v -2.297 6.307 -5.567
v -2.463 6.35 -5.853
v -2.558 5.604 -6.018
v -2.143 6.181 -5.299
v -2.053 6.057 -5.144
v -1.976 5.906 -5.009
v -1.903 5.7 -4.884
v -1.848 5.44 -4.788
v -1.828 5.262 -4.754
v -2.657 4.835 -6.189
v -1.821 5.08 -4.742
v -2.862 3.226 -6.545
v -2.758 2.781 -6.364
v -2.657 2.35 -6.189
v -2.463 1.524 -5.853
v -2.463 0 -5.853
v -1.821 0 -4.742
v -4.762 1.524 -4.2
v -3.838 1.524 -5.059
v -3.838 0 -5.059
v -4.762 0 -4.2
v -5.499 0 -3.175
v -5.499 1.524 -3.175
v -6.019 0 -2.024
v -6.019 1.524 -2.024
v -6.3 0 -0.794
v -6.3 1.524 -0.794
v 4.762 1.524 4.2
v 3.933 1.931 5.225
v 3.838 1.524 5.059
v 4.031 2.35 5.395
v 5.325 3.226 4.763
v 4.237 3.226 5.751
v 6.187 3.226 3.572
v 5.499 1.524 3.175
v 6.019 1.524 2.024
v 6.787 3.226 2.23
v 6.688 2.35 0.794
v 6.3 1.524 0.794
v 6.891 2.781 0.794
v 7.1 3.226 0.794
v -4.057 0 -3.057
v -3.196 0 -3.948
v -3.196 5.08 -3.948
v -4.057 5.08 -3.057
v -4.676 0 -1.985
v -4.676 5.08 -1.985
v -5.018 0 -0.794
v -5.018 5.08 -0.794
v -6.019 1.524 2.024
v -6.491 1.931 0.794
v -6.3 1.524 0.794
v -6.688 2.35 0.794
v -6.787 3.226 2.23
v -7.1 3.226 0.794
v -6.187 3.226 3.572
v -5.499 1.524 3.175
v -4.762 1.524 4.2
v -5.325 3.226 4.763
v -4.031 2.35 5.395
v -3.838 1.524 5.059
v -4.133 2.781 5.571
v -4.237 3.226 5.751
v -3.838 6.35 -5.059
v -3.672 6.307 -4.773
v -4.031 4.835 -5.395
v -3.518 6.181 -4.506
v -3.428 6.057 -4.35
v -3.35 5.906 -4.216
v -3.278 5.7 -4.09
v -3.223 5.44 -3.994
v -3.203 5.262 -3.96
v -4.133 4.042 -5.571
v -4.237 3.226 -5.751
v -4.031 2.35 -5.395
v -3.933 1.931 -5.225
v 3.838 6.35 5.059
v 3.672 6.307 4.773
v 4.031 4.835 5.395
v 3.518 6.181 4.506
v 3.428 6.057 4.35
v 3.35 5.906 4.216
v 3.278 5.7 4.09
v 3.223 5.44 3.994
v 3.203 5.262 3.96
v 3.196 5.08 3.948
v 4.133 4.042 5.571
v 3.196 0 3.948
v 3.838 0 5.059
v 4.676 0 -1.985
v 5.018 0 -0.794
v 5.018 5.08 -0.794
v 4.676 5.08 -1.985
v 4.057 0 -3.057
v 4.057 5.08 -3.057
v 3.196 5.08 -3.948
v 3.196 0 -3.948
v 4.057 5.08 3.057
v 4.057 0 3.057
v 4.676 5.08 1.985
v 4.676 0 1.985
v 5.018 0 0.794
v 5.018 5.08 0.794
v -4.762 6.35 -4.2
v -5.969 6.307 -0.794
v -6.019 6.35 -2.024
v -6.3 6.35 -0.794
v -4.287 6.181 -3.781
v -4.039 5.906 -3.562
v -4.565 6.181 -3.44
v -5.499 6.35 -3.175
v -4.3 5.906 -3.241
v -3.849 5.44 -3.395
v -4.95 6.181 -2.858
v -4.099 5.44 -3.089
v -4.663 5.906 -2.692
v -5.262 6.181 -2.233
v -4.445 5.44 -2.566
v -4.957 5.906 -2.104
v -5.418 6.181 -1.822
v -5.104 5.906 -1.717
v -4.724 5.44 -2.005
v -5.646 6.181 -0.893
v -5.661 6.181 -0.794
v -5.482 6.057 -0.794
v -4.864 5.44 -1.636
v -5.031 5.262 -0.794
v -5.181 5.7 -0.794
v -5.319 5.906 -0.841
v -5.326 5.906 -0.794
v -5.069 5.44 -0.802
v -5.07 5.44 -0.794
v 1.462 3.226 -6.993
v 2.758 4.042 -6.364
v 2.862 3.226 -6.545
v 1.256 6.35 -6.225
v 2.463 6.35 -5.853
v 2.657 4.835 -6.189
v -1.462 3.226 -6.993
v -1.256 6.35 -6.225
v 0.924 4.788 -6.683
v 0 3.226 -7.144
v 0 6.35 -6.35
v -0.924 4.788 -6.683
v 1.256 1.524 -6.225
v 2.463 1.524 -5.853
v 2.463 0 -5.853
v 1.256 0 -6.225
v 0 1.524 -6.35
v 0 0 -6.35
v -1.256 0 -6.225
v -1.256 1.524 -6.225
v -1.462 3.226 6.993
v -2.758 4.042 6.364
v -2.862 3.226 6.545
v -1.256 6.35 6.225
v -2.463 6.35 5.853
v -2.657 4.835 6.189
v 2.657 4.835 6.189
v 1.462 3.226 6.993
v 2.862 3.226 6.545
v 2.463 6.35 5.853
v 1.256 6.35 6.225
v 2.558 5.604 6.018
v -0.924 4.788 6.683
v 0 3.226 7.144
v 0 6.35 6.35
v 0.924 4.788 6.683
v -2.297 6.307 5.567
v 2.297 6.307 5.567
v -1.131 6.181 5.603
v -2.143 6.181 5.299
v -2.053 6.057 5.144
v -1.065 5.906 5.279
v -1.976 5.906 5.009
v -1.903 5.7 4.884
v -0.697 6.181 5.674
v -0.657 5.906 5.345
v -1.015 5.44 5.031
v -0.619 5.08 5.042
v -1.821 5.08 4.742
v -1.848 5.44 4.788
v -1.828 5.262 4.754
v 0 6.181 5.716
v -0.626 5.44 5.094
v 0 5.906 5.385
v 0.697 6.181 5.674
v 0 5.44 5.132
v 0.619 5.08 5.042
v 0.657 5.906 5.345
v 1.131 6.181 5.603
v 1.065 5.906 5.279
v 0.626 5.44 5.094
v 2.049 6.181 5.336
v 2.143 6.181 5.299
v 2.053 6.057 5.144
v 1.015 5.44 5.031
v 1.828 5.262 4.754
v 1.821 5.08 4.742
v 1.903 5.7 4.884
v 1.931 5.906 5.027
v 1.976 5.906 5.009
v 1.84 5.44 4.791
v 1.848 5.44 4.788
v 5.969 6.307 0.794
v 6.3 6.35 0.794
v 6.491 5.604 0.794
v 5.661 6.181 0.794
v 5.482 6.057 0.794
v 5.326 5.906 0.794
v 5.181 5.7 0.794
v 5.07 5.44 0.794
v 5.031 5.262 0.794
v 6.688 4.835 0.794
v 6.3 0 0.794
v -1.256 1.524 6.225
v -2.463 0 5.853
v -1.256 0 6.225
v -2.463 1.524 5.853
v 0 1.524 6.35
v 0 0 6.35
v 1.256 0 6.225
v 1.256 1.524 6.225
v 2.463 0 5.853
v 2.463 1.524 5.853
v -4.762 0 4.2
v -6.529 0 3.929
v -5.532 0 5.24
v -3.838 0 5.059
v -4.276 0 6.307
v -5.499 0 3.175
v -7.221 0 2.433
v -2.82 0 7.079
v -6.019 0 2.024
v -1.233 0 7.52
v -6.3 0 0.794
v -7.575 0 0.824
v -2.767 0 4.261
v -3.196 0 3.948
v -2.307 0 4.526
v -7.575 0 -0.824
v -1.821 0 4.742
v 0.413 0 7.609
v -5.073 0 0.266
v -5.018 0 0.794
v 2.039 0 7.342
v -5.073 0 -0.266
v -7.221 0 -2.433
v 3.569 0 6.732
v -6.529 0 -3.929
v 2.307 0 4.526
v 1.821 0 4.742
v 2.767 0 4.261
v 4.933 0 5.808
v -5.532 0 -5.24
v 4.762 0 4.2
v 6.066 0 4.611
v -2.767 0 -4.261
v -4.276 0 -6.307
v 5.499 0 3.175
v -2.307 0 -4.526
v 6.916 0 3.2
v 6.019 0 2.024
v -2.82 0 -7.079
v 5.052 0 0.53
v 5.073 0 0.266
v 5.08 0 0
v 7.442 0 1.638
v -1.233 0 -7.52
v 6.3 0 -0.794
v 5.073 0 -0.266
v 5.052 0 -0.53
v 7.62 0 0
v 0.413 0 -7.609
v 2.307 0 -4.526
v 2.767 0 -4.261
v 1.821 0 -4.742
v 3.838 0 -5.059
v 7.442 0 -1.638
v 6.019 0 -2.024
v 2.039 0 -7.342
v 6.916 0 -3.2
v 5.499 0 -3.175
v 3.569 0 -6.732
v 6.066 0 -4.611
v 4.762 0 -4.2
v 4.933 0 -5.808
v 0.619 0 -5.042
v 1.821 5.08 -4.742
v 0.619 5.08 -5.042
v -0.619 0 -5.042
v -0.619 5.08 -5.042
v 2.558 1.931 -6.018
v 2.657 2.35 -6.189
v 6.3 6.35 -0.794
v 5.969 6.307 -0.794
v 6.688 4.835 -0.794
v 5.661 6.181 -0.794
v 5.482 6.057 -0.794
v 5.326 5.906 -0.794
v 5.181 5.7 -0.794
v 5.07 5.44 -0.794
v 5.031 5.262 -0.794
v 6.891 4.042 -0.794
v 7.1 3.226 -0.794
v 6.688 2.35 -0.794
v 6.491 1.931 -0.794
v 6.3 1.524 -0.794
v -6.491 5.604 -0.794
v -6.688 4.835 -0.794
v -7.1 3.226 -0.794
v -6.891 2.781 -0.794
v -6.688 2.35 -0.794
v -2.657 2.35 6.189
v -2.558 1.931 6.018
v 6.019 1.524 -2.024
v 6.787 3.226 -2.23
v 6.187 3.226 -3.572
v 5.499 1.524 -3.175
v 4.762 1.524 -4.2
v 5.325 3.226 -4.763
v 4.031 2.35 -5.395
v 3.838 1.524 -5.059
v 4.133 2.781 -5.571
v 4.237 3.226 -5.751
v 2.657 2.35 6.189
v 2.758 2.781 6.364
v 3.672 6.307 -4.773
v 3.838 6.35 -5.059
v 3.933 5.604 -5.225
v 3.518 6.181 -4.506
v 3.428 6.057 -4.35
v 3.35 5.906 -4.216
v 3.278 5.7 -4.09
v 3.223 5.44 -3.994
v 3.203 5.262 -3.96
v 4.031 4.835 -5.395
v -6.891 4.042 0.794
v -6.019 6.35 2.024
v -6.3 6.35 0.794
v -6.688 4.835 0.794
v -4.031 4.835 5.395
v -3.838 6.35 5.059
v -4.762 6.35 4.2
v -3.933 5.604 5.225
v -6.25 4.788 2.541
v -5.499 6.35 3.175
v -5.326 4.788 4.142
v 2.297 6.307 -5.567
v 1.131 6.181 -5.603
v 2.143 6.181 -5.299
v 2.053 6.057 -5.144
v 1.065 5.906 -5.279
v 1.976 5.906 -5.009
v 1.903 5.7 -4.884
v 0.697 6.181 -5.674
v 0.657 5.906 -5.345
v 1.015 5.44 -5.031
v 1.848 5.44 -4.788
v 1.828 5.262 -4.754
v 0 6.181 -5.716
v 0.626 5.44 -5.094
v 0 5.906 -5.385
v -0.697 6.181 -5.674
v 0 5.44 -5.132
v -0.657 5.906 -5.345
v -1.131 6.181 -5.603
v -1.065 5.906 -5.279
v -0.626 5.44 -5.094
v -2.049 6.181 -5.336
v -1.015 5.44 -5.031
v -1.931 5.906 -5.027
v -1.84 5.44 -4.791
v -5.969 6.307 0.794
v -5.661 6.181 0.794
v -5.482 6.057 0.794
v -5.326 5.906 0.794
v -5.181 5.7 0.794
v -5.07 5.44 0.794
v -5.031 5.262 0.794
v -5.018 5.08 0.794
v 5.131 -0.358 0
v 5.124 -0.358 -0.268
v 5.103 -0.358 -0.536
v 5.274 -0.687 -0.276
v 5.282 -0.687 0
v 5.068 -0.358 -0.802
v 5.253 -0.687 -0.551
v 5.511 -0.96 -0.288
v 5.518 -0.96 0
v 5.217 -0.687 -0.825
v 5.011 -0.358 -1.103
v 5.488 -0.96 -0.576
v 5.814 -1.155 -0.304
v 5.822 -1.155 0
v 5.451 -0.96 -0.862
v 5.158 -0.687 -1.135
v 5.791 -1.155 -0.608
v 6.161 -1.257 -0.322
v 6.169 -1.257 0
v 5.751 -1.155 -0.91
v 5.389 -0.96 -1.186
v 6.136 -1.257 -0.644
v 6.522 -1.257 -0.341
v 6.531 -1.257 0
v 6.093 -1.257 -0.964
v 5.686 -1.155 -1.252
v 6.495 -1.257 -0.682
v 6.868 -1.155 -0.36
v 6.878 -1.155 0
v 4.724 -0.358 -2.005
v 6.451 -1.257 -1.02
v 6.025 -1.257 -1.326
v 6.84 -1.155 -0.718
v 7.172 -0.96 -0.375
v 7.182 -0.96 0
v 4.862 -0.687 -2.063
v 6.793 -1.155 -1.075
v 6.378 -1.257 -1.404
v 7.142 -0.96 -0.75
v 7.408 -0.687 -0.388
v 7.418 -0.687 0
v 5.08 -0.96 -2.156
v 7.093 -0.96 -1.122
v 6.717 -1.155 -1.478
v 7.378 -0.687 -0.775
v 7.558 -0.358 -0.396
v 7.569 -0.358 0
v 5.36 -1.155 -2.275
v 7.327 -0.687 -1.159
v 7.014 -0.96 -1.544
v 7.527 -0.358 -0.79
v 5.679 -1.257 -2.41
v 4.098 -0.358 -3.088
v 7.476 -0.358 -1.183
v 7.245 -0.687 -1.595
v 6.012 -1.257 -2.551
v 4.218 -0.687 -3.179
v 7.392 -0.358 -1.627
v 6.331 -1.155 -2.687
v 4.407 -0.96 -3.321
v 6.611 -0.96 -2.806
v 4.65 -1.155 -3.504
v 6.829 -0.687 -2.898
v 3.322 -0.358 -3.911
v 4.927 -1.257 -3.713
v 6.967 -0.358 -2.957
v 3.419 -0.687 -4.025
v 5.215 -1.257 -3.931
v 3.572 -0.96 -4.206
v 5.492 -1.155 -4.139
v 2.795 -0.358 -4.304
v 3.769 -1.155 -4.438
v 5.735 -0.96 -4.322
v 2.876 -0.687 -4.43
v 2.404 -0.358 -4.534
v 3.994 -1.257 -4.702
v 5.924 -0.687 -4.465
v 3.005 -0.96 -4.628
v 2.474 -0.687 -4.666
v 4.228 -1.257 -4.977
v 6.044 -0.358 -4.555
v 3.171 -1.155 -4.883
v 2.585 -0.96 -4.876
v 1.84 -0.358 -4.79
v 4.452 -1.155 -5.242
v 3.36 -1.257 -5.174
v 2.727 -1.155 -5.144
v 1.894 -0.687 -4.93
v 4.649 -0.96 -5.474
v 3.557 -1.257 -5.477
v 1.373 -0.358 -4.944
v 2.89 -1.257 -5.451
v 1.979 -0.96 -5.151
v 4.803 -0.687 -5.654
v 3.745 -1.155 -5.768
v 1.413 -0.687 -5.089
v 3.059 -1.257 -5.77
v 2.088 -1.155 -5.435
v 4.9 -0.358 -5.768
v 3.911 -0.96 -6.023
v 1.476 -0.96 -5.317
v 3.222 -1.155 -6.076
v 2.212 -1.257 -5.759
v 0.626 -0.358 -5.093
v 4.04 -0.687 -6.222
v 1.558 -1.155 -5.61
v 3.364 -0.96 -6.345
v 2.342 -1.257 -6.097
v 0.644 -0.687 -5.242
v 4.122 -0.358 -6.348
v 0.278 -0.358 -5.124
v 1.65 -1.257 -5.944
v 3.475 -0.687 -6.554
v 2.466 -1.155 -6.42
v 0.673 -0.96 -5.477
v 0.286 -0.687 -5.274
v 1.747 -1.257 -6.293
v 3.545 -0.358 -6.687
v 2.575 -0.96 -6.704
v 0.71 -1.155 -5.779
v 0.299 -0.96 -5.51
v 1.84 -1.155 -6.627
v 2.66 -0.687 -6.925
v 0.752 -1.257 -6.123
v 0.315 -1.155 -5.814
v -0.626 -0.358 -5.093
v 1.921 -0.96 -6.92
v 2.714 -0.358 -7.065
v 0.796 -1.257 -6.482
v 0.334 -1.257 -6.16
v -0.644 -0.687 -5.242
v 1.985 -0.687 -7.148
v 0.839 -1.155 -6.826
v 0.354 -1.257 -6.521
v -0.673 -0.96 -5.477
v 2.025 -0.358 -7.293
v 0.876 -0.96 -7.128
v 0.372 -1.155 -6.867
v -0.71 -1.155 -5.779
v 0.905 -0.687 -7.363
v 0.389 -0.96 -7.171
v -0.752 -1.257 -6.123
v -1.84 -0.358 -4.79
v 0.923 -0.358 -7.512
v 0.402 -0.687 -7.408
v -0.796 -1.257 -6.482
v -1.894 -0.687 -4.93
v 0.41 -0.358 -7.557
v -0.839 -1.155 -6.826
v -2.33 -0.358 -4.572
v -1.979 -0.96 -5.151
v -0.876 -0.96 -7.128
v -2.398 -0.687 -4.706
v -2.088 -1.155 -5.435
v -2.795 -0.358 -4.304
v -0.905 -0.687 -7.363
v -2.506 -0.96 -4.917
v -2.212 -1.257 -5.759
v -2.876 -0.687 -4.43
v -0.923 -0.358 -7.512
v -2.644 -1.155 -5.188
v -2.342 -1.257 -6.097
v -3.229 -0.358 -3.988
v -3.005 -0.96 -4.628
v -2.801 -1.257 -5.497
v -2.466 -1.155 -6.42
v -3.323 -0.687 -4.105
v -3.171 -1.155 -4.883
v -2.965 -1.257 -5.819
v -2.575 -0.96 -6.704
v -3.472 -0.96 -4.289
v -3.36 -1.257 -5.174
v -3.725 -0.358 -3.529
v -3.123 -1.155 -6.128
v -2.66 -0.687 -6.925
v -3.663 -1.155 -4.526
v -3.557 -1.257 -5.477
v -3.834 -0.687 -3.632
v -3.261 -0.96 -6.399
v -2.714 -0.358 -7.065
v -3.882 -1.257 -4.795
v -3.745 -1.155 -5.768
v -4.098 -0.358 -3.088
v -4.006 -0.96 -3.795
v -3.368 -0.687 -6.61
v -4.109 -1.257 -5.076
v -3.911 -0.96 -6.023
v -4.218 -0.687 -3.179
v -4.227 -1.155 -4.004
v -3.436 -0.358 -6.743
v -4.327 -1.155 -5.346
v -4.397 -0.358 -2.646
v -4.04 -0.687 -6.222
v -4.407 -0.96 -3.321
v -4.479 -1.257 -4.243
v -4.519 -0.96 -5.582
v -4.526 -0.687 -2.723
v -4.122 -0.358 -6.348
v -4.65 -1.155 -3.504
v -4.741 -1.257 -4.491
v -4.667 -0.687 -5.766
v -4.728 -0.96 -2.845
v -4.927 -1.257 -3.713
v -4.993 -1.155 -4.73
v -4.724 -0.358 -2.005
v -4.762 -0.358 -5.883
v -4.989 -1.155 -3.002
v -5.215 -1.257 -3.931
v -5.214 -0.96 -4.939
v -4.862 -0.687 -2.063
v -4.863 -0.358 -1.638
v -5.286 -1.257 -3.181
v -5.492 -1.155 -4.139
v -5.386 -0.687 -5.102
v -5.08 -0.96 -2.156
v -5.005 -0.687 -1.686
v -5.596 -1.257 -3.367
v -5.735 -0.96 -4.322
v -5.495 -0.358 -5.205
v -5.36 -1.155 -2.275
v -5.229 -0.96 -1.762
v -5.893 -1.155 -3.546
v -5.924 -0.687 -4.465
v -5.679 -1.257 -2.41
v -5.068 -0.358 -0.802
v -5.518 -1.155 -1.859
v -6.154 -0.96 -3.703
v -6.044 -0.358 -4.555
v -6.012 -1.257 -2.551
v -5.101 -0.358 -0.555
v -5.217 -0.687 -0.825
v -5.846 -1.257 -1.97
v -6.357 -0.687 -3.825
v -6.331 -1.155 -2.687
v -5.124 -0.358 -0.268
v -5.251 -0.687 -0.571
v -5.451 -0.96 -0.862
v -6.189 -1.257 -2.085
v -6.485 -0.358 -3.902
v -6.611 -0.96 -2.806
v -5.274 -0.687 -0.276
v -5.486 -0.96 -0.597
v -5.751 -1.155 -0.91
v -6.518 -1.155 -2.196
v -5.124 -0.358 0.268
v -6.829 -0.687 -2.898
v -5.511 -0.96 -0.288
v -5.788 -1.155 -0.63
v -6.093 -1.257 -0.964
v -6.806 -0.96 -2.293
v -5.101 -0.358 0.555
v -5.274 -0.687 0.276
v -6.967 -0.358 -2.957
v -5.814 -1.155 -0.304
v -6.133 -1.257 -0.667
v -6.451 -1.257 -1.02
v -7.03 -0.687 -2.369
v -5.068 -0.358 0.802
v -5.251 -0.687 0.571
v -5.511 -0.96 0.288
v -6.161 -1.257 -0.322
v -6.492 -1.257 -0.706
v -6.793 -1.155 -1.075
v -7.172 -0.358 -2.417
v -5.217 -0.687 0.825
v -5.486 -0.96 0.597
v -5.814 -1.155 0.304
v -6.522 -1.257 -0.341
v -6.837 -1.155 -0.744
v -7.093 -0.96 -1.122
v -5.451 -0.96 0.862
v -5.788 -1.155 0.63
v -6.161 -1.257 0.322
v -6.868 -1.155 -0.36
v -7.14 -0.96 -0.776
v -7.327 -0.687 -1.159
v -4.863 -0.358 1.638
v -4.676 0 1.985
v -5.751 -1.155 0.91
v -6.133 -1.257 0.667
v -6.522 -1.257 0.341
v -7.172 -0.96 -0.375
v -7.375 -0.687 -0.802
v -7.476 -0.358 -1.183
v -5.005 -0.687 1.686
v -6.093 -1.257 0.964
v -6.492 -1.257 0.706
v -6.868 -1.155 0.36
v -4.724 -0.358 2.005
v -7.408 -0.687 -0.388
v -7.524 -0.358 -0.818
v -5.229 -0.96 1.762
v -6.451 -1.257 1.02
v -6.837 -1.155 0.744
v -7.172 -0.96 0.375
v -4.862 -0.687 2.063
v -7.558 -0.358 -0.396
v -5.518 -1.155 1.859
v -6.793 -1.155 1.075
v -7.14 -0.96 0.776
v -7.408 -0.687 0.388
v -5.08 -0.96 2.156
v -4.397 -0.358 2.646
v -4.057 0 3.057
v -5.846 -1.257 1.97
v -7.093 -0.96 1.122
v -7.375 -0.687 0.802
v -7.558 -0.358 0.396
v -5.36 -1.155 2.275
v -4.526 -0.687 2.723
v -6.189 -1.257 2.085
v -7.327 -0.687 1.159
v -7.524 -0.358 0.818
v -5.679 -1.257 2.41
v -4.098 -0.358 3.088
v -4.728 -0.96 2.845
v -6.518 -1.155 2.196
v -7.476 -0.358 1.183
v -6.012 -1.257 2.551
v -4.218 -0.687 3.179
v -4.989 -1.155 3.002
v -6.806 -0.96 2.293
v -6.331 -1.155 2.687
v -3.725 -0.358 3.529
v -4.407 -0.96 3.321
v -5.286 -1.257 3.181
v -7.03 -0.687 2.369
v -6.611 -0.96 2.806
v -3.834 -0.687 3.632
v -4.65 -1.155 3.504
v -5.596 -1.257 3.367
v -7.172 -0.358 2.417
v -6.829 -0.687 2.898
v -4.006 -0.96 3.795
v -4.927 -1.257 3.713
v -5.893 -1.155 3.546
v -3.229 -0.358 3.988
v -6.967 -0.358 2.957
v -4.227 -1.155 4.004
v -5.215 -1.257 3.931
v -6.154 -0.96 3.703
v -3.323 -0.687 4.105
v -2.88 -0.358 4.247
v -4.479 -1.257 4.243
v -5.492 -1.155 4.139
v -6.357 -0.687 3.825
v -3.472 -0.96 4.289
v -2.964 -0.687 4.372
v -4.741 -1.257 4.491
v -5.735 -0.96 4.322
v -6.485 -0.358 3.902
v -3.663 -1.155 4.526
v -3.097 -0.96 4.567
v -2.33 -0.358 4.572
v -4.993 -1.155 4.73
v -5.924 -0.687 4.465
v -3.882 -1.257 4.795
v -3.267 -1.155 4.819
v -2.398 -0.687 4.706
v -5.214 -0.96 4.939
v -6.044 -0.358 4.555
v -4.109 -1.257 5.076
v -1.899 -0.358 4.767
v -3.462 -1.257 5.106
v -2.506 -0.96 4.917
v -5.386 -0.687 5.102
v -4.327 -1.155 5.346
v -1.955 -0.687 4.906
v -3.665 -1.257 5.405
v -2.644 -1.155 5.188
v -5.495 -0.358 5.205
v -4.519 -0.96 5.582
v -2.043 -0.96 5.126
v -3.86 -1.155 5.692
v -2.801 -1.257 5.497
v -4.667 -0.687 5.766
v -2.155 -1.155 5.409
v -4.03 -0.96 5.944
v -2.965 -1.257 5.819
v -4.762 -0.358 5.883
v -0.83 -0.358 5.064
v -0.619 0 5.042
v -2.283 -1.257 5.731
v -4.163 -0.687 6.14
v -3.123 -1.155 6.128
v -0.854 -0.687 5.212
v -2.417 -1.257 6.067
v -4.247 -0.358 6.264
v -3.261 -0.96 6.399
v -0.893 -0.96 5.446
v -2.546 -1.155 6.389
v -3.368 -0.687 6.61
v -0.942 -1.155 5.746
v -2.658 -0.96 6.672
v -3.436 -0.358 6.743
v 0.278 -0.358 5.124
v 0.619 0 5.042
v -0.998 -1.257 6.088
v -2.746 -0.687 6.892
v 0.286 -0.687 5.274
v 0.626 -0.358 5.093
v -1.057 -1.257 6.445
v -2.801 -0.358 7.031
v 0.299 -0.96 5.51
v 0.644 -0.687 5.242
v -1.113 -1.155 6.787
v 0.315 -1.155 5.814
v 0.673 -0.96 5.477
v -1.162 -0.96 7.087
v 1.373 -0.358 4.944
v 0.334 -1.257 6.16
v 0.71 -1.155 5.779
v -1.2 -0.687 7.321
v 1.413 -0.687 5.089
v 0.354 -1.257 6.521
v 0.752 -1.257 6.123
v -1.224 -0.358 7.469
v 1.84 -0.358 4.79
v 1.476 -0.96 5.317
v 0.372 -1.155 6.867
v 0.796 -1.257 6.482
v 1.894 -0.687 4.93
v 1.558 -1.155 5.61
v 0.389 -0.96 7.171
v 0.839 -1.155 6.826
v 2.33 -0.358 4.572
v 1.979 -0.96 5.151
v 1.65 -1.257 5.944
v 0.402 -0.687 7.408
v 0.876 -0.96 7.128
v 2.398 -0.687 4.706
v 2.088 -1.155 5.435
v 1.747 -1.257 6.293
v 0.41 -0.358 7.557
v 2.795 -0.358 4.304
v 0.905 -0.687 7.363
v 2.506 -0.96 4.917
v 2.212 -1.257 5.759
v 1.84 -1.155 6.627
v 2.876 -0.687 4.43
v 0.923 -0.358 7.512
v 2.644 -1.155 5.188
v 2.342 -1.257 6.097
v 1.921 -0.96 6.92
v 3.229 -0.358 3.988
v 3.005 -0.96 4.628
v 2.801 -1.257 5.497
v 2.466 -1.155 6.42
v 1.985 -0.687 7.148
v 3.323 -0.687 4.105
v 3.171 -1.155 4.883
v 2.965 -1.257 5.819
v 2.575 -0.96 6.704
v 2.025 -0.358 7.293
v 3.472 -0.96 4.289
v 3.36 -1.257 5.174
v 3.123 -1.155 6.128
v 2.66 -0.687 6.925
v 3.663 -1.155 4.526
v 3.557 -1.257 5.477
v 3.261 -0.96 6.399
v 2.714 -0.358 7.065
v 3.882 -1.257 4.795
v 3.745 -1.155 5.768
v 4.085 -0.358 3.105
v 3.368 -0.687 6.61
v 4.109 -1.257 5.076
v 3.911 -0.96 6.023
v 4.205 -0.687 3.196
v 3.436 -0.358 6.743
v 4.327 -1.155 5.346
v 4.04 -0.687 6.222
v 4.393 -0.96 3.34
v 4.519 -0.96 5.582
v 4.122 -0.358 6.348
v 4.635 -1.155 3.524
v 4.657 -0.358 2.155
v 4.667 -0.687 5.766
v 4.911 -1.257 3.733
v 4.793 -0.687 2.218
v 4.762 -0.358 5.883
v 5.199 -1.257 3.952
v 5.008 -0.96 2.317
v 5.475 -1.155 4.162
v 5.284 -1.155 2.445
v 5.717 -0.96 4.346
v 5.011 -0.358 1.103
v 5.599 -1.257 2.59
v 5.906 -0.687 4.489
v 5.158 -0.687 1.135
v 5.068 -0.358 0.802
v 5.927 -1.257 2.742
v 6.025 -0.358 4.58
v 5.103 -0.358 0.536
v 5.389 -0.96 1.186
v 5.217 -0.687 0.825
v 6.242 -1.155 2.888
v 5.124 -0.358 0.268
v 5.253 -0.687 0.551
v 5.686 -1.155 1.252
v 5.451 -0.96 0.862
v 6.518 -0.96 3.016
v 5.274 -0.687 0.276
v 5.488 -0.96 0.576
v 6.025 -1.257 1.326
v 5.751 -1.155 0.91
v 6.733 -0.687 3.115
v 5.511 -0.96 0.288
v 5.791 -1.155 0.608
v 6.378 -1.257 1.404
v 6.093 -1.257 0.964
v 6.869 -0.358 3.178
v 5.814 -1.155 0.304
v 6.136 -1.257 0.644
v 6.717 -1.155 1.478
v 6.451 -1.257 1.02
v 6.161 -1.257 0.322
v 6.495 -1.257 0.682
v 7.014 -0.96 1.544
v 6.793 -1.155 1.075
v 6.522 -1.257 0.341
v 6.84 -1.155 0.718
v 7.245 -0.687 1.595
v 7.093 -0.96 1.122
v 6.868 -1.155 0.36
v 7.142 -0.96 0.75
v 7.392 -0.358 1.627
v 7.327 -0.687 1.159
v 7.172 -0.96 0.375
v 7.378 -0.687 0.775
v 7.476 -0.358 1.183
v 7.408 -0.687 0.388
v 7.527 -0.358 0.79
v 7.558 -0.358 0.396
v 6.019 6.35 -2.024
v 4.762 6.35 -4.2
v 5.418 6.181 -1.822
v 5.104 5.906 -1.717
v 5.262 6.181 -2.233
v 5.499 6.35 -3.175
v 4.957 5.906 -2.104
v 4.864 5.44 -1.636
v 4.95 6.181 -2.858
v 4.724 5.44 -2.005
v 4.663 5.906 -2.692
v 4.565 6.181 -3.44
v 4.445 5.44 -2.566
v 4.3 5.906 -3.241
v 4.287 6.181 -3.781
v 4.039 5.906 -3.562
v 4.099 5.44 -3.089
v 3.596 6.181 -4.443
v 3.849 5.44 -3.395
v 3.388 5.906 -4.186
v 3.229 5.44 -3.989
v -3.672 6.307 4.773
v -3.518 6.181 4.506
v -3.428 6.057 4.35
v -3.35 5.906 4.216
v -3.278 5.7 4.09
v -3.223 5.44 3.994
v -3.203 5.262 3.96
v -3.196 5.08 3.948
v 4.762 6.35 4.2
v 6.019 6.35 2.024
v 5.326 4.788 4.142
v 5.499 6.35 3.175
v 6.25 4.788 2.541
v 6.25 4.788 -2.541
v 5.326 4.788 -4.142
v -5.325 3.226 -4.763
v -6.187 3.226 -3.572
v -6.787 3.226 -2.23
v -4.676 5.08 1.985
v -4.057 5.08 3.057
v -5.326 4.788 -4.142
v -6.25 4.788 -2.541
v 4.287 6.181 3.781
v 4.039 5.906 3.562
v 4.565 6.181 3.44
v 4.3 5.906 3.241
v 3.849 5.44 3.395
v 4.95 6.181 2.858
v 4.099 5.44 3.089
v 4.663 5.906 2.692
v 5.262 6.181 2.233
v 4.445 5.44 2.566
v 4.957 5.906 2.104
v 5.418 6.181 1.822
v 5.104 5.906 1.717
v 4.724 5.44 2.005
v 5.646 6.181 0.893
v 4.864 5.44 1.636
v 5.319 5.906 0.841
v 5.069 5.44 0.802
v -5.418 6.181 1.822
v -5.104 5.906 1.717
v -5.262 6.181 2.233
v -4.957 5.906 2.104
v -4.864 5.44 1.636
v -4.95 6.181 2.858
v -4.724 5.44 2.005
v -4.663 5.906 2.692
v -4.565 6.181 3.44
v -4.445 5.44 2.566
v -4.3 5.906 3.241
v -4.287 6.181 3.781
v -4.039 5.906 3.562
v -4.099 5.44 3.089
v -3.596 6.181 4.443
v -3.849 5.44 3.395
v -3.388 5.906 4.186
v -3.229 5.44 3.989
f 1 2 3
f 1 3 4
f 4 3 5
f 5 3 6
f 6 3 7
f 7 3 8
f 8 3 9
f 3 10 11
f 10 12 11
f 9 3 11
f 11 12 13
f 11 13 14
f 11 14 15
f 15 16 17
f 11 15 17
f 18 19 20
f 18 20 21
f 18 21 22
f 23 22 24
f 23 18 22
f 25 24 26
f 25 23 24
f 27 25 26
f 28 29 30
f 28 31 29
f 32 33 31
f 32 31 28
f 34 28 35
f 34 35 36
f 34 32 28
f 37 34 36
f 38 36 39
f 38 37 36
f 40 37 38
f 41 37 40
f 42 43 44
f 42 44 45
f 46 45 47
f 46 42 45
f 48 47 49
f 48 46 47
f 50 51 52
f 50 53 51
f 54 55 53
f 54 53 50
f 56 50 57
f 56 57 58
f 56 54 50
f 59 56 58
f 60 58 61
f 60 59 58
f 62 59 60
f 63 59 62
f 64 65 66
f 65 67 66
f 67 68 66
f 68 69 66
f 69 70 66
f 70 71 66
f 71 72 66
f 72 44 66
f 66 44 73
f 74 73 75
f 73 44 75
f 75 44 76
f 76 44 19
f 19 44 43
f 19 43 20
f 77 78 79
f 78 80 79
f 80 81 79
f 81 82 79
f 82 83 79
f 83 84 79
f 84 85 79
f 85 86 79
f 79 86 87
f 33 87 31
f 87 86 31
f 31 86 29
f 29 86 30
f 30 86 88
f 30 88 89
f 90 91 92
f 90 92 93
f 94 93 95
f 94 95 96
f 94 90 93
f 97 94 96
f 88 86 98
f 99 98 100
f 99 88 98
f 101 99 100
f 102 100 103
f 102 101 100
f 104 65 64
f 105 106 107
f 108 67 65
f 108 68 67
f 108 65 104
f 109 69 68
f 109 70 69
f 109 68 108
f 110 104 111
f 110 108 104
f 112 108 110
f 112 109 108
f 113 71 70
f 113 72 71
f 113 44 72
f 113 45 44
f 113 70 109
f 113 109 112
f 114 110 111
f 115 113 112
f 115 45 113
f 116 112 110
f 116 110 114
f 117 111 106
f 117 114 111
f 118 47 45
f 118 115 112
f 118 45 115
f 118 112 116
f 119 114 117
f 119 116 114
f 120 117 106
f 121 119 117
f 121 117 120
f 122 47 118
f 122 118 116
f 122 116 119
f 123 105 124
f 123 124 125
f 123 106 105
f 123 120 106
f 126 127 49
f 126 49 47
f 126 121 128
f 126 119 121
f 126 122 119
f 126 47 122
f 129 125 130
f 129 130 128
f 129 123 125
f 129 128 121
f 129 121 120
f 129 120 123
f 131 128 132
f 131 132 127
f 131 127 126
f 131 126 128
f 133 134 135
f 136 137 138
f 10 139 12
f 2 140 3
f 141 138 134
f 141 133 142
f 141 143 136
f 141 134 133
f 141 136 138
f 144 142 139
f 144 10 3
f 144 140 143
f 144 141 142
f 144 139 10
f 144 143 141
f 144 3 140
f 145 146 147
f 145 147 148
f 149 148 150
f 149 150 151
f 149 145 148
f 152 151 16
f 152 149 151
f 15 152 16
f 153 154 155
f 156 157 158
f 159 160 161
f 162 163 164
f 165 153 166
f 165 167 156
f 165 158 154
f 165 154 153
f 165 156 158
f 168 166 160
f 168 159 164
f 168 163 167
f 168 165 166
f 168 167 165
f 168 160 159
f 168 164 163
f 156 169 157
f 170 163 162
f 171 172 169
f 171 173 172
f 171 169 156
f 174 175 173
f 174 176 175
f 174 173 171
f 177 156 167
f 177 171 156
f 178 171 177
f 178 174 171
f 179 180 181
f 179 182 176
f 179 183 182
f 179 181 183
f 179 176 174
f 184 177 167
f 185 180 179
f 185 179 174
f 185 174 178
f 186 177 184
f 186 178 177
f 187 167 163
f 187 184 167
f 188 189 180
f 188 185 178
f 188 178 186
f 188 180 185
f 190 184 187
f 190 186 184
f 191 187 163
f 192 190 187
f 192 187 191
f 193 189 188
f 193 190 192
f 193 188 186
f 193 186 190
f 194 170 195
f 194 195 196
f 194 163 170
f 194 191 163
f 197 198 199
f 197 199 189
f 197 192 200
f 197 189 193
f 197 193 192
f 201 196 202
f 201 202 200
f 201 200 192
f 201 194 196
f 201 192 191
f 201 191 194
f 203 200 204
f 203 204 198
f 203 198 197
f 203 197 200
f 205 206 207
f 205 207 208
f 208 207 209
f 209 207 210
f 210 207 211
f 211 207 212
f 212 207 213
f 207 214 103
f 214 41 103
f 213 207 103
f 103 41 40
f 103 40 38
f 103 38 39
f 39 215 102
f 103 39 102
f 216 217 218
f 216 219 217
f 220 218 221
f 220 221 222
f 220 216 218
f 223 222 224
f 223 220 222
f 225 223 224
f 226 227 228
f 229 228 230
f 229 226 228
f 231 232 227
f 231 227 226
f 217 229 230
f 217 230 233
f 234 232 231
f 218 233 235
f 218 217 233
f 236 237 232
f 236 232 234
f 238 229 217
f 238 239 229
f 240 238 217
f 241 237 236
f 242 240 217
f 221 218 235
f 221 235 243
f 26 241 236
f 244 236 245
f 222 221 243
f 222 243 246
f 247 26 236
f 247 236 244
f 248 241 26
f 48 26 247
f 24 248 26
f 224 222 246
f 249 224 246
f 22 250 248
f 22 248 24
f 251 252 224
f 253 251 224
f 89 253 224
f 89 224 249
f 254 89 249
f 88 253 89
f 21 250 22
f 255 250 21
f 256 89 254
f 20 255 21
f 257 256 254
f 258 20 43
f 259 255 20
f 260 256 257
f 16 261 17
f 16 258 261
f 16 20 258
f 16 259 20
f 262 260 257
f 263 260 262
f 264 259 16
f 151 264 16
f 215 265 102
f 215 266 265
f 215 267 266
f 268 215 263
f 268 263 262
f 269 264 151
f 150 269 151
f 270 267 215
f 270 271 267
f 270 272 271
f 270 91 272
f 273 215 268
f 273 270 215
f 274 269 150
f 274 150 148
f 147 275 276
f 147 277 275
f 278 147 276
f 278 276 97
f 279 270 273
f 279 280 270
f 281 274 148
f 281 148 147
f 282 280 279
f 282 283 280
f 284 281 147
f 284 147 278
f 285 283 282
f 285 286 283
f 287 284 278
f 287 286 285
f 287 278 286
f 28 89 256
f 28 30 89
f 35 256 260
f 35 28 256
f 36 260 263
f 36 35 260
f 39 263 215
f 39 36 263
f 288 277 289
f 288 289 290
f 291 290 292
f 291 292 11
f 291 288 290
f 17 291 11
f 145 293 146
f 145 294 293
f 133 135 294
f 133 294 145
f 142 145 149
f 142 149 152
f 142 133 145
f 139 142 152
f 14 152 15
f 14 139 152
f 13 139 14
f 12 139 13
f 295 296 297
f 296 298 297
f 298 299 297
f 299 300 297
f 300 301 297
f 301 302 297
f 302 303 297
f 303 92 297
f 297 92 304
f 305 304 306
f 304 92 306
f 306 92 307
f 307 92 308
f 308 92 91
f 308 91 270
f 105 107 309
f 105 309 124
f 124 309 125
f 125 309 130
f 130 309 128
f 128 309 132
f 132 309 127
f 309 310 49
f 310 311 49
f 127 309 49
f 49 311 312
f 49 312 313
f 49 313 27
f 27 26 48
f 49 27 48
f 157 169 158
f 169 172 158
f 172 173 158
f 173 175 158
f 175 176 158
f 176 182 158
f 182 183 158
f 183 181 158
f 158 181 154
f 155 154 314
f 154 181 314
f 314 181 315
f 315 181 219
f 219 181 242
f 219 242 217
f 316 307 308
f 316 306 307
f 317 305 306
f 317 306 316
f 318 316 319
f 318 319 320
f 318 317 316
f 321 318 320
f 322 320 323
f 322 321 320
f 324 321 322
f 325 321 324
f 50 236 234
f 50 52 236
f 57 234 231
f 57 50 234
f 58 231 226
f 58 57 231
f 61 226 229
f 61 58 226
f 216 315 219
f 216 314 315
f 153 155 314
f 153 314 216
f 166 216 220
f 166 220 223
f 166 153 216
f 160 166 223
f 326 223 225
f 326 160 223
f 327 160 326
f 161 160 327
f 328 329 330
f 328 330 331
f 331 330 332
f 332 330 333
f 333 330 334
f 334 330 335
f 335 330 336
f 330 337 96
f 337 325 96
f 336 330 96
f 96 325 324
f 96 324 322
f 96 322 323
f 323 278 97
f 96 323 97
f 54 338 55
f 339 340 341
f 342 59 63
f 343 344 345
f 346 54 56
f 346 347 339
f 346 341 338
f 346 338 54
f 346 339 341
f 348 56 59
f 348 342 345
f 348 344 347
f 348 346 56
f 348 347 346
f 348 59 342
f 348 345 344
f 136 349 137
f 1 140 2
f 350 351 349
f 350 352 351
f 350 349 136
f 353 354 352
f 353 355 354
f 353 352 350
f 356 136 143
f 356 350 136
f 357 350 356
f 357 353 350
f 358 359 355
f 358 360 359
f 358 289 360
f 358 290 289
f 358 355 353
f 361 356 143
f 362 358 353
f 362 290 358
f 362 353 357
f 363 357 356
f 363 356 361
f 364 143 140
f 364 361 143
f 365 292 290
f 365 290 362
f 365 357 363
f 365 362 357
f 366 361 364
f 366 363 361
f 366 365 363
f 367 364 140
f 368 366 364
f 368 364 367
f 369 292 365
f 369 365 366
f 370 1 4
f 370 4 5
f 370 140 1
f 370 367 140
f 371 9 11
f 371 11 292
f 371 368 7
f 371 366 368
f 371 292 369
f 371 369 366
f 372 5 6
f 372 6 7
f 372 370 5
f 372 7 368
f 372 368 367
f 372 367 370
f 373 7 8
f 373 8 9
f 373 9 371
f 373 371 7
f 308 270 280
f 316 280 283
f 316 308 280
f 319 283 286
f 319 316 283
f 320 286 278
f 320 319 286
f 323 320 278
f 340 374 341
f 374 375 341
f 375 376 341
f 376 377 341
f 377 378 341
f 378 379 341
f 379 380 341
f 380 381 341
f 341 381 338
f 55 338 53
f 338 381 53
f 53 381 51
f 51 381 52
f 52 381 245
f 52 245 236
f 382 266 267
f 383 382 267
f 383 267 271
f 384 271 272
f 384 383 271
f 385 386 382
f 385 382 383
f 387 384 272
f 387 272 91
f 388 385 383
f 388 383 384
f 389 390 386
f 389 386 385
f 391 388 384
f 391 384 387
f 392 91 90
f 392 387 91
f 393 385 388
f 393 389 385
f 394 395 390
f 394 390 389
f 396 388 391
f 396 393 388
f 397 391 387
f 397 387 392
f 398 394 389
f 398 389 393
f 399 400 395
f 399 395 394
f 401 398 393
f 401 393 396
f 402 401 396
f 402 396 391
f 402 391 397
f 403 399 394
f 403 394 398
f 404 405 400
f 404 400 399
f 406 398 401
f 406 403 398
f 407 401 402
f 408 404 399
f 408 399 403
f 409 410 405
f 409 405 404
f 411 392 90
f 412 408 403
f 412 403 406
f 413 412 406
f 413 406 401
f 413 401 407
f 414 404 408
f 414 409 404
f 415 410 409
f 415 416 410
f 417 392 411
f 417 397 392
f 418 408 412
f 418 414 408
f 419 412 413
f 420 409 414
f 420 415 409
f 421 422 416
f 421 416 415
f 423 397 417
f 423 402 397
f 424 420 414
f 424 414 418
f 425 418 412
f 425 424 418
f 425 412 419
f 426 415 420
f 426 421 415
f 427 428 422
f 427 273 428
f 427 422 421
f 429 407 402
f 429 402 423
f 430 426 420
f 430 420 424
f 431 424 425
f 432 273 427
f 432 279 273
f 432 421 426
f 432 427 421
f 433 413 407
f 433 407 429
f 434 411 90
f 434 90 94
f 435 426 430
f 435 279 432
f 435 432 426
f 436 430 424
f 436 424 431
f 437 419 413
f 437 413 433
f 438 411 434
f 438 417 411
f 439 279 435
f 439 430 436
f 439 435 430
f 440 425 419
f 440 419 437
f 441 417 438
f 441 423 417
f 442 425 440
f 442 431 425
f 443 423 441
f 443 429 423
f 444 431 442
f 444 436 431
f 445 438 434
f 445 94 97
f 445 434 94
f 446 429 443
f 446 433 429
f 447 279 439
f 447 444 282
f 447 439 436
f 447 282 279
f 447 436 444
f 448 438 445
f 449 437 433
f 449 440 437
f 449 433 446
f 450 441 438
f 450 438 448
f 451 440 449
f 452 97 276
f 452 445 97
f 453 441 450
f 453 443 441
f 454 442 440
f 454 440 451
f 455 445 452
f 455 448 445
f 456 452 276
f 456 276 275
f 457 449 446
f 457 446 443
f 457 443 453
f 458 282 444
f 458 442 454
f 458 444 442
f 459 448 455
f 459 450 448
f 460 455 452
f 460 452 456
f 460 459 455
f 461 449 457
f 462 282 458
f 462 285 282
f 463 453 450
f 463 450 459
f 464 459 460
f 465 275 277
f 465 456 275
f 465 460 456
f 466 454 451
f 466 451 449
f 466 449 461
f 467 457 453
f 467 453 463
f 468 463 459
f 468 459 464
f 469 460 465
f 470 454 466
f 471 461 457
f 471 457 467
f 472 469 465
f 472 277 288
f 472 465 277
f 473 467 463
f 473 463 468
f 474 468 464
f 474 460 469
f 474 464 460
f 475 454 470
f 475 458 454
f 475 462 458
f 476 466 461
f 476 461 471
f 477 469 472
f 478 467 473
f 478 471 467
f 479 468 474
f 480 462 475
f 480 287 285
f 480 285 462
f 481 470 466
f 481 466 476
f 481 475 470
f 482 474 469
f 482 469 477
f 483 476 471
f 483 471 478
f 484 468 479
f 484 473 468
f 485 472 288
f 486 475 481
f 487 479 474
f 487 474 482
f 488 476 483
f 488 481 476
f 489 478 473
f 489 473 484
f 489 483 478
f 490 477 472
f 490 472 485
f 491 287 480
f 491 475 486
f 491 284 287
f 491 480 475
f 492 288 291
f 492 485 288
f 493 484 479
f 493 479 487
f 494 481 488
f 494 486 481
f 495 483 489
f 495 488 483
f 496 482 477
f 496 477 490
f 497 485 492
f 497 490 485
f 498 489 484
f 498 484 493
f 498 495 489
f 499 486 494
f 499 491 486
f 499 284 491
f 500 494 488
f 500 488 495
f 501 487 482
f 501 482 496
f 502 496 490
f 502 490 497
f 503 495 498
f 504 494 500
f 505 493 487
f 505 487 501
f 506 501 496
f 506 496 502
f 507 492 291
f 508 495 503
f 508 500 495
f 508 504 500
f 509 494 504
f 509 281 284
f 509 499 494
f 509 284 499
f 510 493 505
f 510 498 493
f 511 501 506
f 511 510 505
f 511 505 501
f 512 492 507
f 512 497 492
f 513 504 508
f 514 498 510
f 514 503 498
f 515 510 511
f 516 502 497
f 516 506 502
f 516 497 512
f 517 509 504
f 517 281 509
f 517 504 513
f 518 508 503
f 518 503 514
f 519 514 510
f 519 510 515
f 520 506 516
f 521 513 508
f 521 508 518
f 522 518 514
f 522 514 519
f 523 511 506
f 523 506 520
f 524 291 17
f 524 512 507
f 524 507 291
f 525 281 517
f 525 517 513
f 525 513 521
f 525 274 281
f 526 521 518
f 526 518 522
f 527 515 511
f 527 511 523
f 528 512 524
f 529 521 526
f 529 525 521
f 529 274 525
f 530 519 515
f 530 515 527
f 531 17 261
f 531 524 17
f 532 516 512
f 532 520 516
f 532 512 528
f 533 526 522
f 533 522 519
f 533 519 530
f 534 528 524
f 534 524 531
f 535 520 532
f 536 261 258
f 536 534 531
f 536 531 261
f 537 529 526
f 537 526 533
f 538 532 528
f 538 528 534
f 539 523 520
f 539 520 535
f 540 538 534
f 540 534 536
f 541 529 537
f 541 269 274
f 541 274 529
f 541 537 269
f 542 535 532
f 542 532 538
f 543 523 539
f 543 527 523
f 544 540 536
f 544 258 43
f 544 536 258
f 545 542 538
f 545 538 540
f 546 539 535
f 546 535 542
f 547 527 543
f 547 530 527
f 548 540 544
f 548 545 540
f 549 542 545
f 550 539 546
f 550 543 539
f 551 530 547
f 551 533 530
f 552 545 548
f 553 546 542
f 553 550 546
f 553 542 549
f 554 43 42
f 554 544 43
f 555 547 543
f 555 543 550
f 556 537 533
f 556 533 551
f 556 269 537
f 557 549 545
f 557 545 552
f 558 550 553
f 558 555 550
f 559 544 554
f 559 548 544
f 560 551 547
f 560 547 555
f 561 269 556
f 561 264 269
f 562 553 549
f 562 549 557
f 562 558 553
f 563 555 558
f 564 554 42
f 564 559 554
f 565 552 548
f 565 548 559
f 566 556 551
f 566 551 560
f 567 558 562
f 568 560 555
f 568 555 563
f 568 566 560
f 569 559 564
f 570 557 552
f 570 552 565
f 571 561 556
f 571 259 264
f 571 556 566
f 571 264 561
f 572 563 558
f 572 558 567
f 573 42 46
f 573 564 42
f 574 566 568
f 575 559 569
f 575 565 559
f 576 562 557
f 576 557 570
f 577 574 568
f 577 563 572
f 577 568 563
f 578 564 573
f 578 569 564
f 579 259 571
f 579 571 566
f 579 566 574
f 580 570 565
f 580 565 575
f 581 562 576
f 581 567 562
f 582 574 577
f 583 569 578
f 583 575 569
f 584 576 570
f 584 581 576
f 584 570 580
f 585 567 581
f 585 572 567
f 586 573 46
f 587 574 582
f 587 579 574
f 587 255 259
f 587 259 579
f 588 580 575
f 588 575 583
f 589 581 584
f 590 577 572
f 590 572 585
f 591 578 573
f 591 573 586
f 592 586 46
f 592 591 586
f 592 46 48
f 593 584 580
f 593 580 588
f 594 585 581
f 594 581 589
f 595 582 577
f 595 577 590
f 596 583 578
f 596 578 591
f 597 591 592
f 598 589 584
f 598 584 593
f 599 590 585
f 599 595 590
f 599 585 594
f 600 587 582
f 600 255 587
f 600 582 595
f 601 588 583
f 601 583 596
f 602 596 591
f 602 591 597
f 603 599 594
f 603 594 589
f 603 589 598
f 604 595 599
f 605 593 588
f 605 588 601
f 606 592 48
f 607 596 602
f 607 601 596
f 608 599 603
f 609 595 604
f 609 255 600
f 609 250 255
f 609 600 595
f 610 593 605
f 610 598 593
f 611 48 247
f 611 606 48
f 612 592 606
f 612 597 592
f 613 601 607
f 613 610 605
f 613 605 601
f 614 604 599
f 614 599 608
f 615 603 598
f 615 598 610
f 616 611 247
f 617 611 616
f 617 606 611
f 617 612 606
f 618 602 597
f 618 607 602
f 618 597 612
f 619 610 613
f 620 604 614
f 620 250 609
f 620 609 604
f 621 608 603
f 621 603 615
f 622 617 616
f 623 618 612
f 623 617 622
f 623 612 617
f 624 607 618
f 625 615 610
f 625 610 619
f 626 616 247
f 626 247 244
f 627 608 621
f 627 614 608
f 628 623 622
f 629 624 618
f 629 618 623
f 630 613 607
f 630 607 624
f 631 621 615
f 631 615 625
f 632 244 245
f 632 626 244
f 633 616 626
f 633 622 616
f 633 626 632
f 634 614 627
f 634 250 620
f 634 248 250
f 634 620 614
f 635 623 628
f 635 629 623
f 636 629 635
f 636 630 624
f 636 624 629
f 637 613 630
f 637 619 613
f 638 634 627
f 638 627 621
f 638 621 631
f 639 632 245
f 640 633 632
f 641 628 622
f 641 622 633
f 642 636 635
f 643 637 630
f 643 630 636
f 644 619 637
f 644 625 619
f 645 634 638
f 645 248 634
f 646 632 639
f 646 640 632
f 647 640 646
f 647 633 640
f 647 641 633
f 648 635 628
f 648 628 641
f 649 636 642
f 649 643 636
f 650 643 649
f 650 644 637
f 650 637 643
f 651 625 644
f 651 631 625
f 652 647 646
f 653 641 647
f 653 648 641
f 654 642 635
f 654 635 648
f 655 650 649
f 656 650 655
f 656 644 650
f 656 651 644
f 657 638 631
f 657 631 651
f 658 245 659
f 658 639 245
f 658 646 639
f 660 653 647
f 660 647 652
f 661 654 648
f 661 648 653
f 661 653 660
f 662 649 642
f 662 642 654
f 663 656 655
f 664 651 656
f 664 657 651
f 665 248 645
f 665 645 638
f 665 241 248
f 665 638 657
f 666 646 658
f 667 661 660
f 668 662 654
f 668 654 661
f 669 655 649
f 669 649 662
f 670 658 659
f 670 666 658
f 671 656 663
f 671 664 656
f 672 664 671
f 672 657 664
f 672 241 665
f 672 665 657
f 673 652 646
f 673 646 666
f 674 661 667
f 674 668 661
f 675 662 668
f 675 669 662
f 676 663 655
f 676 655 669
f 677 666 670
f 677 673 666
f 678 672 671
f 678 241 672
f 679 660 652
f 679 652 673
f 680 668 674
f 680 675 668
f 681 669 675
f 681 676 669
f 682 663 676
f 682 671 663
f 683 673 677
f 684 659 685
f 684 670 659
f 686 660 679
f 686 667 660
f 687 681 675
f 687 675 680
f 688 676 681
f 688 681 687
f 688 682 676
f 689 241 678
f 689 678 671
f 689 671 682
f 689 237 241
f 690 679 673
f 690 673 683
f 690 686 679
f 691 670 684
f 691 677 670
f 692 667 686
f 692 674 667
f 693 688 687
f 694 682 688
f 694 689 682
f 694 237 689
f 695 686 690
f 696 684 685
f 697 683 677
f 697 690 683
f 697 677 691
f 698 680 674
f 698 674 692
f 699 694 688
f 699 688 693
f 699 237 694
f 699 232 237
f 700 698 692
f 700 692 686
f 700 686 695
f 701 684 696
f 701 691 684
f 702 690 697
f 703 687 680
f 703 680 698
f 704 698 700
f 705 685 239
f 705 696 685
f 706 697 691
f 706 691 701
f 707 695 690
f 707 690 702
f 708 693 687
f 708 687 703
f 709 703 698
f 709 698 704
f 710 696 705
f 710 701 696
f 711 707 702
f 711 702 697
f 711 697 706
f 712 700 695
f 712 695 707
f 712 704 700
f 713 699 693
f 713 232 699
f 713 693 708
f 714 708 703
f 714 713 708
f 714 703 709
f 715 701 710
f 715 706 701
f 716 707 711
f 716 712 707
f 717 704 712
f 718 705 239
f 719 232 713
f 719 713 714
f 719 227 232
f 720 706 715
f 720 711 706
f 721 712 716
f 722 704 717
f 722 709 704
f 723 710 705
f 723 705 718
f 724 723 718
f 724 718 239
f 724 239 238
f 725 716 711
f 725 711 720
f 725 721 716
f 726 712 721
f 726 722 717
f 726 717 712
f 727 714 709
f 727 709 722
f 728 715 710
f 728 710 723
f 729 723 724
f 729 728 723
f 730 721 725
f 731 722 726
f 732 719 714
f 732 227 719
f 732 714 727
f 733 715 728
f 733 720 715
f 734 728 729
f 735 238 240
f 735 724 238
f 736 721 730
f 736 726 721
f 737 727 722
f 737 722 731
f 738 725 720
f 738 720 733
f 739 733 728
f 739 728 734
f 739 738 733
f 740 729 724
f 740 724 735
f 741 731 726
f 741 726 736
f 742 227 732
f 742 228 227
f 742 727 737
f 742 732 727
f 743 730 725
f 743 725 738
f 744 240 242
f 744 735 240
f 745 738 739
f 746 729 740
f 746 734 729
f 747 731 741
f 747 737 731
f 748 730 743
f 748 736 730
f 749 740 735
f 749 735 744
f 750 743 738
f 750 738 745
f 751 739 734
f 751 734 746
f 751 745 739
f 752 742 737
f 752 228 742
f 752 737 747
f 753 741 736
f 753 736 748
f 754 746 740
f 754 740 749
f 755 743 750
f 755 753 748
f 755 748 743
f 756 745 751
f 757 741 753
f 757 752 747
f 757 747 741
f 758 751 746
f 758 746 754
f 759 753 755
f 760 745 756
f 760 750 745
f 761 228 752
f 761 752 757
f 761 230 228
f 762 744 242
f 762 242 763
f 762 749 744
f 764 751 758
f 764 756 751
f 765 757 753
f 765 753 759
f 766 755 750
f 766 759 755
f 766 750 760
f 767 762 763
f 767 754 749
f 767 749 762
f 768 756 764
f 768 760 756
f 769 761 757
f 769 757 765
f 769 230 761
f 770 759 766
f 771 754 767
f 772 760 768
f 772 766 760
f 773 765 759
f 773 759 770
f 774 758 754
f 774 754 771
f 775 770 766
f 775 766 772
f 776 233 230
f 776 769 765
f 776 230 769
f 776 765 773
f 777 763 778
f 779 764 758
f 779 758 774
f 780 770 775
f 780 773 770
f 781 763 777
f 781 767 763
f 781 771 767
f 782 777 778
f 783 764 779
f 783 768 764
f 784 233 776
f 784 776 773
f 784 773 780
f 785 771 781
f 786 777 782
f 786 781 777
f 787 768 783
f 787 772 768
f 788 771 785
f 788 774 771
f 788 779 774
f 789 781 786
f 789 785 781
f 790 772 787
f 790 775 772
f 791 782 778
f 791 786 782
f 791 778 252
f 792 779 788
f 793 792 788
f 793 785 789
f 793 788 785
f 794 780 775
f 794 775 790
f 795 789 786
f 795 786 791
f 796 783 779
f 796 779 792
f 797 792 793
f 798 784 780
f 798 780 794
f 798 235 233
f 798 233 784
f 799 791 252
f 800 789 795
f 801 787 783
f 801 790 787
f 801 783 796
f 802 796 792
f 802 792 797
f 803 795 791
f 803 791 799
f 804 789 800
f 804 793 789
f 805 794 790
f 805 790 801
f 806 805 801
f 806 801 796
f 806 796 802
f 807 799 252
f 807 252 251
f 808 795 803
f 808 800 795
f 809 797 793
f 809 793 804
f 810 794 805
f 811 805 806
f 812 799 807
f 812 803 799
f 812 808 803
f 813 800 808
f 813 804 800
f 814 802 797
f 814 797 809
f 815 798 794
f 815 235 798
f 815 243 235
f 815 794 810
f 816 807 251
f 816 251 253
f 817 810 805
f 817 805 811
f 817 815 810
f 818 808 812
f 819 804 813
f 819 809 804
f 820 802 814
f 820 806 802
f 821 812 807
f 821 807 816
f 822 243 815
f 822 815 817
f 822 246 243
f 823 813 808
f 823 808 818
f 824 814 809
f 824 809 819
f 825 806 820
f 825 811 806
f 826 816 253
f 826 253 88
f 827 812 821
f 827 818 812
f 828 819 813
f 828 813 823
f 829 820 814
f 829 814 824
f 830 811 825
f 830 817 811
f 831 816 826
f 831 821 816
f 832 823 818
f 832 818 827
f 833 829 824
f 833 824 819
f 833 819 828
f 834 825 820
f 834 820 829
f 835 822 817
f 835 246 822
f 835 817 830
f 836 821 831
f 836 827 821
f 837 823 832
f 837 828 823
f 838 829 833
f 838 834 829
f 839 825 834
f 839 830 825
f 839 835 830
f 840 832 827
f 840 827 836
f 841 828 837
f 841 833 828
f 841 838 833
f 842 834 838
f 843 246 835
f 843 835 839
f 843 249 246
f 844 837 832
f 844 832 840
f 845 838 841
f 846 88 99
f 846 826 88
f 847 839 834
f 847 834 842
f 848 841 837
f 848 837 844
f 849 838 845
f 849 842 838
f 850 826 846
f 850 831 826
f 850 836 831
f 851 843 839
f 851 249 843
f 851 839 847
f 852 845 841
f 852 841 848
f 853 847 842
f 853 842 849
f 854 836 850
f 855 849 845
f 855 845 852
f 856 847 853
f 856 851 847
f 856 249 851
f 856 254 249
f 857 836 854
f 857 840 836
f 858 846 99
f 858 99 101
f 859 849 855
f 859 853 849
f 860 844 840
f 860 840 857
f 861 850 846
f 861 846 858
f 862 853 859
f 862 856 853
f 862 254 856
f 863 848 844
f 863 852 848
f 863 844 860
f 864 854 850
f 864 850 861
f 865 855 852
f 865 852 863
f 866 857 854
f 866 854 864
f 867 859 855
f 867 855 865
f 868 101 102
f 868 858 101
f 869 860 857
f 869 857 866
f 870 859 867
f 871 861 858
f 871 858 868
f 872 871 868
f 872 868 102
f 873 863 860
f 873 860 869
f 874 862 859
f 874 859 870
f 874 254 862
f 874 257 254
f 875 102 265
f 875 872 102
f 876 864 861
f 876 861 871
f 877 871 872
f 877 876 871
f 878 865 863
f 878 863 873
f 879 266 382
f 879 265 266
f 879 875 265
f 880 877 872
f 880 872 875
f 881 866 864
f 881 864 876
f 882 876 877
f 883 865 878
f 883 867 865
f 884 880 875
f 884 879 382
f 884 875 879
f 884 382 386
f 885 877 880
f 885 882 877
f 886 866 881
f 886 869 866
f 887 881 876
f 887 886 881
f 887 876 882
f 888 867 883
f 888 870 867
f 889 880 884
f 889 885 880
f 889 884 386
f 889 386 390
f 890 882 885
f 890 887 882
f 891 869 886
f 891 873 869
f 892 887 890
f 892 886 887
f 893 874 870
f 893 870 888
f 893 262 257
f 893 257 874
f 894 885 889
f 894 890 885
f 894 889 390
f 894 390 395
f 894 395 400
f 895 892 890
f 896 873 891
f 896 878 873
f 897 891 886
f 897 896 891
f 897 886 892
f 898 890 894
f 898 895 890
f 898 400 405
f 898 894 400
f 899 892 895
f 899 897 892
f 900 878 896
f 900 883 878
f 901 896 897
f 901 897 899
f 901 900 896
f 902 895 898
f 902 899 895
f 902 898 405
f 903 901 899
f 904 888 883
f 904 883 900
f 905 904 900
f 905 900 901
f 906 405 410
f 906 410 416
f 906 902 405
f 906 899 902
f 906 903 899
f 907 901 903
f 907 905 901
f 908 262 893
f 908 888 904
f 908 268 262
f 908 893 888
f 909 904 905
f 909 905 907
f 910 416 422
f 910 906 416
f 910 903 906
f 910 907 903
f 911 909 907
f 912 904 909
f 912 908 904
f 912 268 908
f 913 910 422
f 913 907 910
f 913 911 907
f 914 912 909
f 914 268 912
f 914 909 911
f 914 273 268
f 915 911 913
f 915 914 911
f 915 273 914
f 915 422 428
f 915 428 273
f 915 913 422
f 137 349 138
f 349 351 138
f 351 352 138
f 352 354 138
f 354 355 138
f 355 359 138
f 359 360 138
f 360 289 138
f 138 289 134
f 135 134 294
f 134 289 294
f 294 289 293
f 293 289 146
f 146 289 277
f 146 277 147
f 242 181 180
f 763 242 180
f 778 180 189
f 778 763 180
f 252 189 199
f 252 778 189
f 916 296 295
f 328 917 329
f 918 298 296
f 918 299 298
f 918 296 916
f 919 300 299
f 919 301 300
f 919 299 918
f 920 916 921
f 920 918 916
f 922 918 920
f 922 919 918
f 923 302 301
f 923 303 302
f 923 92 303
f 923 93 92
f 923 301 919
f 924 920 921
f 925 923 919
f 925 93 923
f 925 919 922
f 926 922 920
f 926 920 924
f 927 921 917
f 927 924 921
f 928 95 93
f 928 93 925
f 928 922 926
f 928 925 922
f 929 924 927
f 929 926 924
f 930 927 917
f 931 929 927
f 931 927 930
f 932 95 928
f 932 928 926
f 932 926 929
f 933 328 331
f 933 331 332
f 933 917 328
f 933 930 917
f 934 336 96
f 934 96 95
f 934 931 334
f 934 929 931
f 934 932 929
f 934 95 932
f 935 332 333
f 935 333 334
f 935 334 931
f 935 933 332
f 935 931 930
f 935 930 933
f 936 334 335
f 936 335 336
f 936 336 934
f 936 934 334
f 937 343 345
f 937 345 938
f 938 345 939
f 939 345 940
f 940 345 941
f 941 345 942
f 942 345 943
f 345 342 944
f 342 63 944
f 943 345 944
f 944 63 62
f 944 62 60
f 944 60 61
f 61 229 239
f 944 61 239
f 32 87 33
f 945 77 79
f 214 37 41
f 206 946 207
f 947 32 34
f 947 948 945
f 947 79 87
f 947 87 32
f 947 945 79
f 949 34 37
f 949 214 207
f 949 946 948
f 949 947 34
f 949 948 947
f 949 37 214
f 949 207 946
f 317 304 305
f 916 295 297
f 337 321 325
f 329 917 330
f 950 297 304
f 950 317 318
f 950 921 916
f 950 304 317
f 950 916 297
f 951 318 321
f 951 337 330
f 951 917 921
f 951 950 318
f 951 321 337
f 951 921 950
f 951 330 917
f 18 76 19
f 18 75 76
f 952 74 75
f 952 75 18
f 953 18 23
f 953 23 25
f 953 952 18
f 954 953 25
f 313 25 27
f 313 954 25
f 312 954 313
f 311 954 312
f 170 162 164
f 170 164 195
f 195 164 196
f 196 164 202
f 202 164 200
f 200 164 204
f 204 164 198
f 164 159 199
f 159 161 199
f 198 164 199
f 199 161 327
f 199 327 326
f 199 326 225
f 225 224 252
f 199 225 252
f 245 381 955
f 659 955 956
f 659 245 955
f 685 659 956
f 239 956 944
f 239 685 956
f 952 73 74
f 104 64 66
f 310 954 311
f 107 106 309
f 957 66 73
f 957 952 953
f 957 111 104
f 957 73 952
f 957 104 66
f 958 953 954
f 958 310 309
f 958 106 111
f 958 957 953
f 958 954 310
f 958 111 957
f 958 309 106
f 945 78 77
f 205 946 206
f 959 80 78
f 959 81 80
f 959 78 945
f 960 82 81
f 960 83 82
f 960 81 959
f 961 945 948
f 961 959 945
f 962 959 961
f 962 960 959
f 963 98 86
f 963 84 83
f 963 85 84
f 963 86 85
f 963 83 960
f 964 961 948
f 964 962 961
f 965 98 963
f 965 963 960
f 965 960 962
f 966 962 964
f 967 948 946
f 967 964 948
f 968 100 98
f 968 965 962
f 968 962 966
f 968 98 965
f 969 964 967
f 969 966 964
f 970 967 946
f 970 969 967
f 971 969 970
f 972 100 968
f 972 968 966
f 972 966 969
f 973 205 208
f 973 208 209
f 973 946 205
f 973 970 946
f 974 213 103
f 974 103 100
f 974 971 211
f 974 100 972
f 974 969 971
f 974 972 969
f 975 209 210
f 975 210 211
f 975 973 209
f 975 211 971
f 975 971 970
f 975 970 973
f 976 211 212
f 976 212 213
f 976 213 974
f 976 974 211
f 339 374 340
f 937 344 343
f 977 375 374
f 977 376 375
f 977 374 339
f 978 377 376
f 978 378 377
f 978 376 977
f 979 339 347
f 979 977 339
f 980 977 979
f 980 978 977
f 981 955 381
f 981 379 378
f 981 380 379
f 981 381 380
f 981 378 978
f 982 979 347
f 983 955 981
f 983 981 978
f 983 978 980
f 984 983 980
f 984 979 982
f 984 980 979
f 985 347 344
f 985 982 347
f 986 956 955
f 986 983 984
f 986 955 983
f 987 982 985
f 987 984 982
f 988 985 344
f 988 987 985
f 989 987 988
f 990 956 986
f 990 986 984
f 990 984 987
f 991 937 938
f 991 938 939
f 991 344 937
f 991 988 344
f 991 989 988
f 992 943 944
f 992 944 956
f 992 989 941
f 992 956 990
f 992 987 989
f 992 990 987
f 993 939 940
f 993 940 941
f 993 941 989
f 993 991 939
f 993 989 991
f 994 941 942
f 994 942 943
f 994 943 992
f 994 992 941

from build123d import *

# Parameters (mm, degrees)
F3_DEPTH = 6.351


with BuildPart() as f1:
    # F0 (on Top) → F1 (revolve)
    with BuildSketch(Plane.XY):
        with BuildLine():
            Line((7.62, 0), (6.35, 0))
            Line((6.35, 0), (6.35, 1.524))
            Line((6.35, 1.524), (7.14375, 3.226202))
            Line((7.14375, 3.226202), (6.35, 6.35))
            ThreePointArc((6.35, 6.35), (5.451974, 5.978026), (5.08, 5.08))
            Line((5.08, 5.08), (5.08, 0))
            ThreePointArc((5.08, 0), (6.35, -1.27), (7.62, 0))
        make_face()
    revolve(axis=Axis((0, 3.175, 0), (0, 1, 0)))

    # F2 (on Front) → F3 (cut, through all)
    with BuildSketch(Plane.XZ):
        Polygon((-1.374815, 0.79375), (-0.458272, 0.79375), (0, 1.5875), (-5.662592, 11.395398), (-7.037408, 10.601648), align=None)
        Polygon((0, 1.5875), (0.458272, 0.79375), (1.374815, 0.79375), (7.037408, 10.601648), (5.662592, 11.395398), align=None)
        Polygon((-0.916544, 0), (-1.374815, 0.79375), (-12.7, 0.79375), (-12.7, -0.79375), (-1.374815, -0.79375), align=None)
        Polygon((12.7, 0.79375), (1.374815, 0.79375), (0.916544, 0), (1.374815, -0.79375), (12.7, -0.79375), align=None)
        Polygon((0, -1.5875), (-0.458272, -0.79375), (-1.374815, -0.79375), (-7.037408, -10.601648), (-5.662592, -11.395398), align=None)
        Polygon((1.374815, -0.79375), (0.458272, -0.79375), (0, -1.5875), (5.662592, -11.395398), (7.037408, -10.601648), align=None)
    extrude(amount=-F3_DEPTH, mode=Mode.SUBTRACT)


solid = f1.part
